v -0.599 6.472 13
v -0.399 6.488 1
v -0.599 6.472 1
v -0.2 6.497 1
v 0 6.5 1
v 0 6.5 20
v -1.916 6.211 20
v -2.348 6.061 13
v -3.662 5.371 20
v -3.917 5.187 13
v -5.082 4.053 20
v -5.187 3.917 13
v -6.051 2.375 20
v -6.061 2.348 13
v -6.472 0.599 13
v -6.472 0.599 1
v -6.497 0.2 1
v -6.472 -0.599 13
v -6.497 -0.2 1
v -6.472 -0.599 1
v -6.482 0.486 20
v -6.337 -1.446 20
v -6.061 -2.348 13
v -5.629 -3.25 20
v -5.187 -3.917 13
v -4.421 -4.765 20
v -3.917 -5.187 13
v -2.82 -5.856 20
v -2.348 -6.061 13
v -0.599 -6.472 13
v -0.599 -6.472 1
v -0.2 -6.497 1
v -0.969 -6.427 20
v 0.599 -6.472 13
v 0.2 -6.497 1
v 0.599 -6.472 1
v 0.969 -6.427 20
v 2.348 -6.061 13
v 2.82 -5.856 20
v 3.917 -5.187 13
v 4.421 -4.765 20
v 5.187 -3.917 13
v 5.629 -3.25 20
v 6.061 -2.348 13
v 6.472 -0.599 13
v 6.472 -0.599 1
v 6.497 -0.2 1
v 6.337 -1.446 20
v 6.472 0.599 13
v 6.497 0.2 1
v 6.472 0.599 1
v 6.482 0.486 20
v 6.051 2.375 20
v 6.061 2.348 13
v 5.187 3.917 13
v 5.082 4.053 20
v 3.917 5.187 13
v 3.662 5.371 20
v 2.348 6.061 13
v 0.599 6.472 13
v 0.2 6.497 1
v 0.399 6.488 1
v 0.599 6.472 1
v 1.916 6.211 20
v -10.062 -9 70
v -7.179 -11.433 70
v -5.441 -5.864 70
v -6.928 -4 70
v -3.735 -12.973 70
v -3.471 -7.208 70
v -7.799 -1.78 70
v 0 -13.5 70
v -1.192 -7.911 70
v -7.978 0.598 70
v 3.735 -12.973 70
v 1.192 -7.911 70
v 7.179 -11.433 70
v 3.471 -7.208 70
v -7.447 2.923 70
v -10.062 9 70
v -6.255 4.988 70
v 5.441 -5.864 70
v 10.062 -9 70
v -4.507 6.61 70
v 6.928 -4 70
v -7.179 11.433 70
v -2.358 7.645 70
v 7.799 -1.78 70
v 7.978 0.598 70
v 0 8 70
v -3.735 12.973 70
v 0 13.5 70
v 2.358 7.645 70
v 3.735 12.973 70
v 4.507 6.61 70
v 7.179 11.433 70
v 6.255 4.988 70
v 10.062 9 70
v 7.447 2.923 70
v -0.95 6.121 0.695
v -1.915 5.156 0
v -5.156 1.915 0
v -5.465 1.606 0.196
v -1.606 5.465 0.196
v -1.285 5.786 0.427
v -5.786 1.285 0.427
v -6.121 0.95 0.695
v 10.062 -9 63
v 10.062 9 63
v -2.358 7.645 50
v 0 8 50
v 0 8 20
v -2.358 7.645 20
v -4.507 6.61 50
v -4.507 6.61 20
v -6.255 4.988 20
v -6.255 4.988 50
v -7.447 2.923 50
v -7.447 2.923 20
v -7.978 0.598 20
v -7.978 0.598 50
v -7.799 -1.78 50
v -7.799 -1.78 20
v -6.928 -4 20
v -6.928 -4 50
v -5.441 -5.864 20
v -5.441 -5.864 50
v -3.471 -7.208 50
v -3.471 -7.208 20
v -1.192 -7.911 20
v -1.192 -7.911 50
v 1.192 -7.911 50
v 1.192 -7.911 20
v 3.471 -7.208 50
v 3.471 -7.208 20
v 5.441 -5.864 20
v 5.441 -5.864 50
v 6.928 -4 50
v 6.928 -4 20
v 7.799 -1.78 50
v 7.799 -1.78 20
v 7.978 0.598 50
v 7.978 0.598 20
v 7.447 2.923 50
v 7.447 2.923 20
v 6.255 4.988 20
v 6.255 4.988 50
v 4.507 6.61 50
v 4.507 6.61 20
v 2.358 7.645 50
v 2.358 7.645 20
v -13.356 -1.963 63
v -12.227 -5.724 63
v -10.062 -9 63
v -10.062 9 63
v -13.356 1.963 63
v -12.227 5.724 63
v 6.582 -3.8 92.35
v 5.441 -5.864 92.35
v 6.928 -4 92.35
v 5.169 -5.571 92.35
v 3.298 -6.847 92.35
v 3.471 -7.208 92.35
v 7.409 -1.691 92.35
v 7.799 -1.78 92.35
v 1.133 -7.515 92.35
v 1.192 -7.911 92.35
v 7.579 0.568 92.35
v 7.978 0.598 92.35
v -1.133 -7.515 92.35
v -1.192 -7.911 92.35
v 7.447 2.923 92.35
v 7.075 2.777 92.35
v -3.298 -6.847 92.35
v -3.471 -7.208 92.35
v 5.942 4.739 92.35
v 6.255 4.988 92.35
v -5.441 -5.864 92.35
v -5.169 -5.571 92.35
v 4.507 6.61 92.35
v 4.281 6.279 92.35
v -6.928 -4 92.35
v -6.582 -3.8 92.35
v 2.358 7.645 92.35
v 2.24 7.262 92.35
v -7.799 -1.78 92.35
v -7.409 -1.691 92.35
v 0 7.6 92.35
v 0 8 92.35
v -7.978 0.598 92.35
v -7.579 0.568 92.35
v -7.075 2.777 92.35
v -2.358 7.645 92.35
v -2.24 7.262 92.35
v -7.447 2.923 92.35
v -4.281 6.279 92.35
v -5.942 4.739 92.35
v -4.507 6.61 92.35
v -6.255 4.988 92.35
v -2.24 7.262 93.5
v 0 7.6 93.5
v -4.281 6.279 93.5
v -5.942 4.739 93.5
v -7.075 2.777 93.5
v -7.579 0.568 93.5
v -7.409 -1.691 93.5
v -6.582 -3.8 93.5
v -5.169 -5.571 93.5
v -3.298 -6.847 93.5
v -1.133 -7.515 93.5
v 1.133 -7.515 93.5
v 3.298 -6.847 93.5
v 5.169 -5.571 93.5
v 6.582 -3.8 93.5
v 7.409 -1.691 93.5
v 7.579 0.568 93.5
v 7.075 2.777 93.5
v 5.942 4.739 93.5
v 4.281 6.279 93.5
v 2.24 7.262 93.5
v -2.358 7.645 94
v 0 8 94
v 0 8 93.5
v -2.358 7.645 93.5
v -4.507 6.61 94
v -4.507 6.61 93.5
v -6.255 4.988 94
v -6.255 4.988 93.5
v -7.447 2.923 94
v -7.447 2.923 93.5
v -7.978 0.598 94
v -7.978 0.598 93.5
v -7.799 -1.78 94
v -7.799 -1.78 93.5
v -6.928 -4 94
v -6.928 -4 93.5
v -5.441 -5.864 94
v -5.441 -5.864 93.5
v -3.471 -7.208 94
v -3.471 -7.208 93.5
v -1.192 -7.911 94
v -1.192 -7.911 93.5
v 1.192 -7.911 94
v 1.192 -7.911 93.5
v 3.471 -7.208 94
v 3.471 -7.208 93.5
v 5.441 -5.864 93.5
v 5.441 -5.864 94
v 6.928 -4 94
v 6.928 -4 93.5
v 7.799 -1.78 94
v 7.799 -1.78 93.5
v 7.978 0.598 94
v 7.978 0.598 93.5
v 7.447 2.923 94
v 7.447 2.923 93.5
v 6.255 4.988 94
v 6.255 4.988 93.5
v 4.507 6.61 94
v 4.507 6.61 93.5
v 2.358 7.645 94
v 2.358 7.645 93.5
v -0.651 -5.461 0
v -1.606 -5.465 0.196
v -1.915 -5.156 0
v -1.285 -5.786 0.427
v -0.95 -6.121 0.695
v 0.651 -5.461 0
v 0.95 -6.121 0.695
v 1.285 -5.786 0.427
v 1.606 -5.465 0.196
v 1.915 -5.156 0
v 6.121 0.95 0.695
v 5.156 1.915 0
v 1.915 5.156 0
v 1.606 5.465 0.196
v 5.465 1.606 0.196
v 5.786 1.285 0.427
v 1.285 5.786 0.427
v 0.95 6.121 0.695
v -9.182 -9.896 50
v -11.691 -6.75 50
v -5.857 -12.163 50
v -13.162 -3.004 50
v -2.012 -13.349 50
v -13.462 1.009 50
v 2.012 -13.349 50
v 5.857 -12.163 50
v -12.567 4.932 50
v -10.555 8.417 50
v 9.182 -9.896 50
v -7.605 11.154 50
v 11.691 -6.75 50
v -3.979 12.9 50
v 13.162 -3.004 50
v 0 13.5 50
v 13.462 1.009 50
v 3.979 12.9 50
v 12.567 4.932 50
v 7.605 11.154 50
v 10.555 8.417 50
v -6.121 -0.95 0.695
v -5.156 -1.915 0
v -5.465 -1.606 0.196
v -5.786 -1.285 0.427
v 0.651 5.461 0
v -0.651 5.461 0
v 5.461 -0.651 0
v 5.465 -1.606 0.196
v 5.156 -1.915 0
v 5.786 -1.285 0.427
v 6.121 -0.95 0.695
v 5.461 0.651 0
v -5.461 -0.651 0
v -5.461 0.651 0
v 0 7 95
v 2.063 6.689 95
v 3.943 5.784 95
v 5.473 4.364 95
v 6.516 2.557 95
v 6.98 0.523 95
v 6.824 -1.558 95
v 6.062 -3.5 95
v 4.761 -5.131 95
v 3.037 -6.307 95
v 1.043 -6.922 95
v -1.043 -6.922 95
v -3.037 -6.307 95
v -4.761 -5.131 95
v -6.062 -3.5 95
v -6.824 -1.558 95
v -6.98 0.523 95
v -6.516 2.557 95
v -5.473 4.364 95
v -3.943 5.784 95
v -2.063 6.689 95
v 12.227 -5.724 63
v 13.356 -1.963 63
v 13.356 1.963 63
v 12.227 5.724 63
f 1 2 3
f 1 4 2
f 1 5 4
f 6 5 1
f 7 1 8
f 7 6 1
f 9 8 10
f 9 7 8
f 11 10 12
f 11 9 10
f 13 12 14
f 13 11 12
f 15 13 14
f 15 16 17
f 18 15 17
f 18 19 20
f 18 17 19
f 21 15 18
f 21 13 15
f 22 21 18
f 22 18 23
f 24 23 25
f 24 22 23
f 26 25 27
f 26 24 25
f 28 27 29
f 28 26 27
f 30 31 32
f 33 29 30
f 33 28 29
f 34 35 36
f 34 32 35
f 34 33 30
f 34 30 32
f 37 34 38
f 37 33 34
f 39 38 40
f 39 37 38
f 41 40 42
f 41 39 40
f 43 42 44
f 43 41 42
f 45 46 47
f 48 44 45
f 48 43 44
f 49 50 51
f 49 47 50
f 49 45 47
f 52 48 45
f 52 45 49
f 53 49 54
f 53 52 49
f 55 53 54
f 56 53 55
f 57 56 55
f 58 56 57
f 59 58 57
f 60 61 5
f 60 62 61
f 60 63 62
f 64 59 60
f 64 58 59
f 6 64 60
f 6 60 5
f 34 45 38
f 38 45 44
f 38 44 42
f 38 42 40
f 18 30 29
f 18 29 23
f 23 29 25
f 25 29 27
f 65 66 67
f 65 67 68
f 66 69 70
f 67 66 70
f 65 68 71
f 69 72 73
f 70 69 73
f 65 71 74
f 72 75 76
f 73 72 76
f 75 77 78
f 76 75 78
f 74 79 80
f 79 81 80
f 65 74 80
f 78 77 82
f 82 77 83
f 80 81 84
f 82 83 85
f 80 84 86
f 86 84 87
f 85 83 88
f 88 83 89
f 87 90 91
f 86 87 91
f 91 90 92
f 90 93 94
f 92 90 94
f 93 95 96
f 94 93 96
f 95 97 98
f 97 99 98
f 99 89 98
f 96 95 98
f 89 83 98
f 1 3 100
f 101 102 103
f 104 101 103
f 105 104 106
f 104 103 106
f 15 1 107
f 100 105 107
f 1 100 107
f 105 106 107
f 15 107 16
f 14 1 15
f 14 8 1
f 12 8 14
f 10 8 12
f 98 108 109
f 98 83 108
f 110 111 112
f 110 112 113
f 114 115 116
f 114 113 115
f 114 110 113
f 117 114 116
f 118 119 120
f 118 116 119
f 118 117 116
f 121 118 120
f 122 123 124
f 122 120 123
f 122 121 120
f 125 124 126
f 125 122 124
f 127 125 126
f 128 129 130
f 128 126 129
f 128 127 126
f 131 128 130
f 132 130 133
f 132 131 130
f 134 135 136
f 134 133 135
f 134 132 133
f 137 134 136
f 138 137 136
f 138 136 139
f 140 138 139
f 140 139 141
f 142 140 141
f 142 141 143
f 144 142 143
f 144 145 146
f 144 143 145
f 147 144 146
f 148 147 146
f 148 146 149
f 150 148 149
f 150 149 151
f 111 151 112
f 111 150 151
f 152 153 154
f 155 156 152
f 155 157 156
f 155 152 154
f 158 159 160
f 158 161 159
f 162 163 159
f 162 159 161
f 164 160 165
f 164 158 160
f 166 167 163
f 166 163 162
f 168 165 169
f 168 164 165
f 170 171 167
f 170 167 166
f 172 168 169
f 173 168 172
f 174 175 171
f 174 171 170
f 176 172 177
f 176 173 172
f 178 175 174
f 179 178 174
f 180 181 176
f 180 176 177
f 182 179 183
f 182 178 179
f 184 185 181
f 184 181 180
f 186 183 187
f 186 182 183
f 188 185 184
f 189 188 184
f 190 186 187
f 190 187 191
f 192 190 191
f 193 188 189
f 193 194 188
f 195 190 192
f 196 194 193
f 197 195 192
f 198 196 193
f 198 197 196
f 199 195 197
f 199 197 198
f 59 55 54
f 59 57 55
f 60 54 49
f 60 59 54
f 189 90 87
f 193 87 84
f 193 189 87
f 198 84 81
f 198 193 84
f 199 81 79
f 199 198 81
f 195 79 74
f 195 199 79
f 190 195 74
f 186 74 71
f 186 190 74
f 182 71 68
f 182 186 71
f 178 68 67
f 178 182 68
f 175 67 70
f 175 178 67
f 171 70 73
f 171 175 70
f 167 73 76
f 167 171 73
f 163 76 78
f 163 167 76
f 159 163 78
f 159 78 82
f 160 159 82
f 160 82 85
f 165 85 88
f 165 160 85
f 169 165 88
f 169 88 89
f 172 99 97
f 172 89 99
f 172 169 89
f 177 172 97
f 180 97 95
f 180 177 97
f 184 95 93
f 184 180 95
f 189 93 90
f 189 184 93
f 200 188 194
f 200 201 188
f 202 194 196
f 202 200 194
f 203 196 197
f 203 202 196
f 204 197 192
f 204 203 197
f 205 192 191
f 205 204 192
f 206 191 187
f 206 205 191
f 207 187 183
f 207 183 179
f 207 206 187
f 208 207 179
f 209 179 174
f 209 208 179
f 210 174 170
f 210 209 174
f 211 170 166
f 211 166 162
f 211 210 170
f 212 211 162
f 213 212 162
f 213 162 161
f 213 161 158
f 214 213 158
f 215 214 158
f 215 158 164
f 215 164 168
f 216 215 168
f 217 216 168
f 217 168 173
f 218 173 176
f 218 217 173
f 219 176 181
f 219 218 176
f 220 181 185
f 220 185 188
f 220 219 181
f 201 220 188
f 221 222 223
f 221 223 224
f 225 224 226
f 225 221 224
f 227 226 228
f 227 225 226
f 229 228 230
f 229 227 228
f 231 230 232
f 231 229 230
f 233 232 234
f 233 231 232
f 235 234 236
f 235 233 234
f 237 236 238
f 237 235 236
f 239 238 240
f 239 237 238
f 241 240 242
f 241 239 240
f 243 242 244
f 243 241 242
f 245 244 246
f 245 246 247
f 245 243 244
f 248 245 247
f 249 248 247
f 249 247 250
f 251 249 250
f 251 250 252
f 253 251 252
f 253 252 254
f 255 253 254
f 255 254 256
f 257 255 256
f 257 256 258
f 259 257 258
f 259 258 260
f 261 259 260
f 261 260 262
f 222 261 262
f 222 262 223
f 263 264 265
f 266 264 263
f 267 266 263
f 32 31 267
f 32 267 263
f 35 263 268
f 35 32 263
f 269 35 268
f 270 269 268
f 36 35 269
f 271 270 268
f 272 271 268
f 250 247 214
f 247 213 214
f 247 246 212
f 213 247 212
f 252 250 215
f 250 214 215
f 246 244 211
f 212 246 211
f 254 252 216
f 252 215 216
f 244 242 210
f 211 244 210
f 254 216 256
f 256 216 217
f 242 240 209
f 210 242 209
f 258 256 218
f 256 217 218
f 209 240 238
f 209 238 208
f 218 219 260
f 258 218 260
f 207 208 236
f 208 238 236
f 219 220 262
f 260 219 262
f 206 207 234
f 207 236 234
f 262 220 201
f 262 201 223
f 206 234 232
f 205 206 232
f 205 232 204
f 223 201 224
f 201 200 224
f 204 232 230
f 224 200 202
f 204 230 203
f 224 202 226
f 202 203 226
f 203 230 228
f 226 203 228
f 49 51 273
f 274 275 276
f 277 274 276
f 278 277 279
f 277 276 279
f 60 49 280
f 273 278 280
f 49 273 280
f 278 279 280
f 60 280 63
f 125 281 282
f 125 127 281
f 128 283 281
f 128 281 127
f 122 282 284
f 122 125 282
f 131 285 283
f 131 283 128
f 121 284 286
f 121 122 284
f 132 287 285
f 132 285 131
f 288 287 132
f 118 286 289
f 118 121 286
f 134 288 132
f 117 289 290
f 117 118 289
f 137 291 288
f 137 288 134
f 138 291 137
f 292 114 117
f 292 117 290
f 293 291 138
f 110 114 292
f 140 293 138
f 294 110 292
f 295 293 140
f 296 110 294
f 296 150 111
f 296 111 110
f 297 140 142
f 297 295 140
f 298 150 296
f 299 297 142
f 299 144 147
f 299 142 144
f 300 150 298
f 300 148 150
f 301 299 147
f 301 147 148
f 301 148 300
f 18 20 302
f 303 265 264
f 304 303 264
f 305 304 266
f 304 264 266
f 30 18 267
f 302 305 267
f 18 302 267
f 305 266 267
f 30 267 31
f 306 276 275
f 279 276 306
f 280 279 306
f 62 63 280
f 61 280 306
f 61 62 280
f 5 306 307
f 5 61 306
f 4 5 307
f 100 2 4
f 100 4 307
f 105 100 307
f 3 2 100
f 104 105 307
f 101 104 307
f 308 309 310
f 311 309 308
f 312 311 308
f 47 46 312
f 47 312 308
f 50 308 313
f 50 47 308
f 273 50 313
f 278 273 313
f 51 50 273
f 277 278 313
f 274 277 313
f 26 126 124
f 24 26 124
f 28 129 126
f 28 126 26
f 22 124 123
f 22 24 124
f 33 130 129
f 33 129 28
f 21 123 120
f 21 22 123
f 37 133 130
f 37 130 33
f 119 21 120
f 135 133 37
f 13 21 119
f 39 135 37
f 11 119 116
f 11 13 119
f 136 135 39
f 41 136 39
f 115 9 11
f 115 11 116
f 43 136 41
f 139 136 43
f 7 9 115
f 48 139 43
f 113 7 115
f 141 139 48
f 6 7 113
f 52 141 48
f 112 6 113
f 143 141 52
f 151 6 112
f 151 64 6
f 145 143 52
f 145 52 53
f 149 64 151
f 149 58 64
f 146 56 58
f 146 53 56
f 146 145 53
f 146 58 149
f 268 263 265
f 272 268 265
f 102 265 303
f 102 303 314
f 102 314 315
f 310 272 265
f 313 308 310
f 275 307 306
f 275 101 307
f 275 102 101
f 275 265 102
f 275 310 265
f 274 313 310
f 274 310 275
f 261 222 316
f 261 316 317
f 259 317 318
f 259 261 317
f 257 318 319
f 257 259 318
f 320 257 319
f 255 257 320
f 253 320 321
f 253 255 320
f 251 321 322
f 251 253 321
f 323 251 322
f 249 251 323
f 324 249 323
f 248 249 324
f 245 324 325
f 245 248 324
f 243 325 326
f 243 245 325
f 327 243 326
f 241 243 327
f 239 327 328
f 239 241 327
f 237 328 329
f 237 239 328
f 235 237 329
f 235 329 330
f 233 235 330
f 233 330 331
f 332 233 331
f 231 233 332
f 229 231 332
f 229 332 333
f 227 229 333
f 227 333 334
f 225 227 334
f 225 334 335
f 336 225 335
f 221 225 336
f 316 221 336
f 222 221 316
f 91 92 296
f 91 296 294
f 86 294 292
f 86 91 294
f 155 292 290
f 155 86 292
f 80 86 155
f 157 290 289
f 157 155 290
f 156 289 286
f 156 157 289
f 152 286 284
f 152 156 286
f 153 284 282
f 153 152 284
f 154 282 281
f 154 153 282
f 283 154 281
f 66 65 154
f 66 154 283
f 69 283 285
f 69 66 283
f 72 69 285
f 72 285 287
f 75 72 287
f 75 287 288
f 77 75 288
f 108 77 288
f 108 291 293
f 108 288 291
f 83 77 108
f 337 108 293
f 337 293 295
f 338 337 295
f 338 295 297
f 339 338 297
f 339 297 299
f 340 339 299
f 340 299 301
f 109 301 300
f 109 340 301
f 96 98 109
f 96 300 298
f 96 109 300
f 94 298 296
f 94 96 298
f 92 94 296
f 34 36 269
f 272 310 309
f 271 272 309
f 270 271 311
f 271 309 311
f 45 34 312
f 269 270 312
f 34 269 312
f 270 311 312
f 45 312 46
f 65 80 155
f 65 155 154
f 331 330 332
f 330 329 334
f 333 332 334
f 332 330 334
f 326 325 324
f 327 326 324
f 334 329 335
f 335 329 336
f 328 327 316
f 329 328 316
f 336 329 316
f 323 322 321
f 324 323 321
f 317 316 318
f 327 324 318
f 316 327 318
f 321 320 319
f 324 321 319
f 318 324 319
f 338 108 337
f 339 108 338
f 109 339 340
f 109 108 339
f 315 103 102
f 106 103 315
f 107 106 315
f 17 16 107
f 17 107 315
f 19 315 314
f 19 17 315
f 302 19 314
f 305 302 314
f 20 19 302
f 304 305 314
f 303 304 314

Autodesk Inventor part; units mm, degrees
ref_plane "YZ Plane" through (0, 0, 0) normal (1, 0, 0) x (0, 1, 0)
ref_plane "XZ Plane" through (0, 0, 0) normal (0, 1, 0) x (-1, 0, 0)
ref_plane "XY Plane" through (0, 0, 0) normal (0, 0, 1) x (1, 0, 0)
sketch "스케치1" plane through (0, 0, 0) normal (1, 0, 0) x (0, 1, 0)
  line L0 (0, 0) -> (6.5, 0)
  line L1 (6.5, 0) -> (6.5, 20)
  line L2 (6.5, 20) -> (0, 20)
  line L3 (0, 20) -> (0, 0)
  line L4 (0, 20) -> (8, 20)
  line L5 (8, 20) -> (8, 50)
  line L6 (8, 50) -> (0, 50)
  line L7 (0, 50) -> (0, 20)
  line L8 (0, 50) -> (13.5, 50)
  line L9 (13.5, 50) -> (13.5, 70)
  line L10 (13.5, 70) -> (0, 70)
  line L11 (0, 70) -> (0, 50)
  line L12 (0, 70) -> (8, 70)
  line L13 (8, 70) -> (8, 95)
  line L14 (8, 95) -> (0, 95)
  line L15 (0, 95) -> (0, 70)
  dimension "d0" = 13
  dimension "d1" = 16
  dimension "d2" = 27
  dimension "d3" = 16
  dimension "d4" = 20
  dimension "d5" = 30
  dimension "d6" = 20
  dimension "d7" = 25
revolve "회전1" add sketch "스케치1" angle 360 about axis through (0, 0, 50) along (0, 0, -1)
sketch "스케치2" plane through (0, 0, 0) normal (0, 0, -1) x (-1, 0, 0)
  line L0 (0, 7.0711) -> (7.0711, 0)
  line L1 (7.0711, 0) -> (0, -7.0711)
  line L2 (0, -7.0711) -> (-7.0711, 0)
  line L3 (-7.0711, 0) -> (0, 7.0711)
  circle A0 centre (0, 0) radius 9.2868
  dimension "d9" = 10
extrude "돌출1" cut sketch "스케치2" against normal blind 13
chamfer "모따기1" distance 1 angle 45 5 edges at (-0.2997, 6.4931, 0) (-6.5, 0, 0) (6.5, 0, 0) (0.2997, 6.4931, 0) (0, -6.5, 0)
sketch "스케치3" plane through (0, 0, 70) normal (0, 0, 1) x (1, 0, 0)
  circle A0 centre (0, 0) radius 13.5 projected
  line L0 (-10.0623, 9) -> (-10.0623, -9)
  line L1 (-10.0623, 9) -> (-13.5, 9)
  line L2 (-13.5, 9) -> (-13.5, -9)
  line L3 (-13.5, -9) -> (-10.0623, -9)
  dimension "d15" = 18
extrude "돌출2" cut sketch "스케치3" against normal blind 7 contours L0 A0 | A0 L2 L1 | L3 L2 A0 picked at (-11.0757, -1.0838)
mirror "미러1" about plane through (0, 0, 0) normal (1, 0, 0) of "돌출2"
sketch "스케치4" plane through (0, 0, 0) normal (1, 0, 0) x (0, 1, 0)
  line L0 (8, 92.35) -> (7.6, 92.35)
  line L1 (7.6, 92.35) -> (7.6, 93.5)
  line L2 (7.6, 93.5) -> (8, 93.5)
  line L3 (8, 93.5) -> (8, 92.35)
  line L4 (8, 95) -> (8, 70) projected
  line L5 (0, -19) -> (0, 114) projected
  point P0 (0, 0)
  dimension "d19" = 1.15
  dimension "d20" = 1.5
  dimension "d21" = 0.4
revolve "회전2" cut sketch "스케치4" angle 360 about axis through (0, 0, -10) along (0, 0, 1)
chamfer "모따기2" distance 1 angle 45 1 edges at (0, -8, 95)
properties part number "3강"
